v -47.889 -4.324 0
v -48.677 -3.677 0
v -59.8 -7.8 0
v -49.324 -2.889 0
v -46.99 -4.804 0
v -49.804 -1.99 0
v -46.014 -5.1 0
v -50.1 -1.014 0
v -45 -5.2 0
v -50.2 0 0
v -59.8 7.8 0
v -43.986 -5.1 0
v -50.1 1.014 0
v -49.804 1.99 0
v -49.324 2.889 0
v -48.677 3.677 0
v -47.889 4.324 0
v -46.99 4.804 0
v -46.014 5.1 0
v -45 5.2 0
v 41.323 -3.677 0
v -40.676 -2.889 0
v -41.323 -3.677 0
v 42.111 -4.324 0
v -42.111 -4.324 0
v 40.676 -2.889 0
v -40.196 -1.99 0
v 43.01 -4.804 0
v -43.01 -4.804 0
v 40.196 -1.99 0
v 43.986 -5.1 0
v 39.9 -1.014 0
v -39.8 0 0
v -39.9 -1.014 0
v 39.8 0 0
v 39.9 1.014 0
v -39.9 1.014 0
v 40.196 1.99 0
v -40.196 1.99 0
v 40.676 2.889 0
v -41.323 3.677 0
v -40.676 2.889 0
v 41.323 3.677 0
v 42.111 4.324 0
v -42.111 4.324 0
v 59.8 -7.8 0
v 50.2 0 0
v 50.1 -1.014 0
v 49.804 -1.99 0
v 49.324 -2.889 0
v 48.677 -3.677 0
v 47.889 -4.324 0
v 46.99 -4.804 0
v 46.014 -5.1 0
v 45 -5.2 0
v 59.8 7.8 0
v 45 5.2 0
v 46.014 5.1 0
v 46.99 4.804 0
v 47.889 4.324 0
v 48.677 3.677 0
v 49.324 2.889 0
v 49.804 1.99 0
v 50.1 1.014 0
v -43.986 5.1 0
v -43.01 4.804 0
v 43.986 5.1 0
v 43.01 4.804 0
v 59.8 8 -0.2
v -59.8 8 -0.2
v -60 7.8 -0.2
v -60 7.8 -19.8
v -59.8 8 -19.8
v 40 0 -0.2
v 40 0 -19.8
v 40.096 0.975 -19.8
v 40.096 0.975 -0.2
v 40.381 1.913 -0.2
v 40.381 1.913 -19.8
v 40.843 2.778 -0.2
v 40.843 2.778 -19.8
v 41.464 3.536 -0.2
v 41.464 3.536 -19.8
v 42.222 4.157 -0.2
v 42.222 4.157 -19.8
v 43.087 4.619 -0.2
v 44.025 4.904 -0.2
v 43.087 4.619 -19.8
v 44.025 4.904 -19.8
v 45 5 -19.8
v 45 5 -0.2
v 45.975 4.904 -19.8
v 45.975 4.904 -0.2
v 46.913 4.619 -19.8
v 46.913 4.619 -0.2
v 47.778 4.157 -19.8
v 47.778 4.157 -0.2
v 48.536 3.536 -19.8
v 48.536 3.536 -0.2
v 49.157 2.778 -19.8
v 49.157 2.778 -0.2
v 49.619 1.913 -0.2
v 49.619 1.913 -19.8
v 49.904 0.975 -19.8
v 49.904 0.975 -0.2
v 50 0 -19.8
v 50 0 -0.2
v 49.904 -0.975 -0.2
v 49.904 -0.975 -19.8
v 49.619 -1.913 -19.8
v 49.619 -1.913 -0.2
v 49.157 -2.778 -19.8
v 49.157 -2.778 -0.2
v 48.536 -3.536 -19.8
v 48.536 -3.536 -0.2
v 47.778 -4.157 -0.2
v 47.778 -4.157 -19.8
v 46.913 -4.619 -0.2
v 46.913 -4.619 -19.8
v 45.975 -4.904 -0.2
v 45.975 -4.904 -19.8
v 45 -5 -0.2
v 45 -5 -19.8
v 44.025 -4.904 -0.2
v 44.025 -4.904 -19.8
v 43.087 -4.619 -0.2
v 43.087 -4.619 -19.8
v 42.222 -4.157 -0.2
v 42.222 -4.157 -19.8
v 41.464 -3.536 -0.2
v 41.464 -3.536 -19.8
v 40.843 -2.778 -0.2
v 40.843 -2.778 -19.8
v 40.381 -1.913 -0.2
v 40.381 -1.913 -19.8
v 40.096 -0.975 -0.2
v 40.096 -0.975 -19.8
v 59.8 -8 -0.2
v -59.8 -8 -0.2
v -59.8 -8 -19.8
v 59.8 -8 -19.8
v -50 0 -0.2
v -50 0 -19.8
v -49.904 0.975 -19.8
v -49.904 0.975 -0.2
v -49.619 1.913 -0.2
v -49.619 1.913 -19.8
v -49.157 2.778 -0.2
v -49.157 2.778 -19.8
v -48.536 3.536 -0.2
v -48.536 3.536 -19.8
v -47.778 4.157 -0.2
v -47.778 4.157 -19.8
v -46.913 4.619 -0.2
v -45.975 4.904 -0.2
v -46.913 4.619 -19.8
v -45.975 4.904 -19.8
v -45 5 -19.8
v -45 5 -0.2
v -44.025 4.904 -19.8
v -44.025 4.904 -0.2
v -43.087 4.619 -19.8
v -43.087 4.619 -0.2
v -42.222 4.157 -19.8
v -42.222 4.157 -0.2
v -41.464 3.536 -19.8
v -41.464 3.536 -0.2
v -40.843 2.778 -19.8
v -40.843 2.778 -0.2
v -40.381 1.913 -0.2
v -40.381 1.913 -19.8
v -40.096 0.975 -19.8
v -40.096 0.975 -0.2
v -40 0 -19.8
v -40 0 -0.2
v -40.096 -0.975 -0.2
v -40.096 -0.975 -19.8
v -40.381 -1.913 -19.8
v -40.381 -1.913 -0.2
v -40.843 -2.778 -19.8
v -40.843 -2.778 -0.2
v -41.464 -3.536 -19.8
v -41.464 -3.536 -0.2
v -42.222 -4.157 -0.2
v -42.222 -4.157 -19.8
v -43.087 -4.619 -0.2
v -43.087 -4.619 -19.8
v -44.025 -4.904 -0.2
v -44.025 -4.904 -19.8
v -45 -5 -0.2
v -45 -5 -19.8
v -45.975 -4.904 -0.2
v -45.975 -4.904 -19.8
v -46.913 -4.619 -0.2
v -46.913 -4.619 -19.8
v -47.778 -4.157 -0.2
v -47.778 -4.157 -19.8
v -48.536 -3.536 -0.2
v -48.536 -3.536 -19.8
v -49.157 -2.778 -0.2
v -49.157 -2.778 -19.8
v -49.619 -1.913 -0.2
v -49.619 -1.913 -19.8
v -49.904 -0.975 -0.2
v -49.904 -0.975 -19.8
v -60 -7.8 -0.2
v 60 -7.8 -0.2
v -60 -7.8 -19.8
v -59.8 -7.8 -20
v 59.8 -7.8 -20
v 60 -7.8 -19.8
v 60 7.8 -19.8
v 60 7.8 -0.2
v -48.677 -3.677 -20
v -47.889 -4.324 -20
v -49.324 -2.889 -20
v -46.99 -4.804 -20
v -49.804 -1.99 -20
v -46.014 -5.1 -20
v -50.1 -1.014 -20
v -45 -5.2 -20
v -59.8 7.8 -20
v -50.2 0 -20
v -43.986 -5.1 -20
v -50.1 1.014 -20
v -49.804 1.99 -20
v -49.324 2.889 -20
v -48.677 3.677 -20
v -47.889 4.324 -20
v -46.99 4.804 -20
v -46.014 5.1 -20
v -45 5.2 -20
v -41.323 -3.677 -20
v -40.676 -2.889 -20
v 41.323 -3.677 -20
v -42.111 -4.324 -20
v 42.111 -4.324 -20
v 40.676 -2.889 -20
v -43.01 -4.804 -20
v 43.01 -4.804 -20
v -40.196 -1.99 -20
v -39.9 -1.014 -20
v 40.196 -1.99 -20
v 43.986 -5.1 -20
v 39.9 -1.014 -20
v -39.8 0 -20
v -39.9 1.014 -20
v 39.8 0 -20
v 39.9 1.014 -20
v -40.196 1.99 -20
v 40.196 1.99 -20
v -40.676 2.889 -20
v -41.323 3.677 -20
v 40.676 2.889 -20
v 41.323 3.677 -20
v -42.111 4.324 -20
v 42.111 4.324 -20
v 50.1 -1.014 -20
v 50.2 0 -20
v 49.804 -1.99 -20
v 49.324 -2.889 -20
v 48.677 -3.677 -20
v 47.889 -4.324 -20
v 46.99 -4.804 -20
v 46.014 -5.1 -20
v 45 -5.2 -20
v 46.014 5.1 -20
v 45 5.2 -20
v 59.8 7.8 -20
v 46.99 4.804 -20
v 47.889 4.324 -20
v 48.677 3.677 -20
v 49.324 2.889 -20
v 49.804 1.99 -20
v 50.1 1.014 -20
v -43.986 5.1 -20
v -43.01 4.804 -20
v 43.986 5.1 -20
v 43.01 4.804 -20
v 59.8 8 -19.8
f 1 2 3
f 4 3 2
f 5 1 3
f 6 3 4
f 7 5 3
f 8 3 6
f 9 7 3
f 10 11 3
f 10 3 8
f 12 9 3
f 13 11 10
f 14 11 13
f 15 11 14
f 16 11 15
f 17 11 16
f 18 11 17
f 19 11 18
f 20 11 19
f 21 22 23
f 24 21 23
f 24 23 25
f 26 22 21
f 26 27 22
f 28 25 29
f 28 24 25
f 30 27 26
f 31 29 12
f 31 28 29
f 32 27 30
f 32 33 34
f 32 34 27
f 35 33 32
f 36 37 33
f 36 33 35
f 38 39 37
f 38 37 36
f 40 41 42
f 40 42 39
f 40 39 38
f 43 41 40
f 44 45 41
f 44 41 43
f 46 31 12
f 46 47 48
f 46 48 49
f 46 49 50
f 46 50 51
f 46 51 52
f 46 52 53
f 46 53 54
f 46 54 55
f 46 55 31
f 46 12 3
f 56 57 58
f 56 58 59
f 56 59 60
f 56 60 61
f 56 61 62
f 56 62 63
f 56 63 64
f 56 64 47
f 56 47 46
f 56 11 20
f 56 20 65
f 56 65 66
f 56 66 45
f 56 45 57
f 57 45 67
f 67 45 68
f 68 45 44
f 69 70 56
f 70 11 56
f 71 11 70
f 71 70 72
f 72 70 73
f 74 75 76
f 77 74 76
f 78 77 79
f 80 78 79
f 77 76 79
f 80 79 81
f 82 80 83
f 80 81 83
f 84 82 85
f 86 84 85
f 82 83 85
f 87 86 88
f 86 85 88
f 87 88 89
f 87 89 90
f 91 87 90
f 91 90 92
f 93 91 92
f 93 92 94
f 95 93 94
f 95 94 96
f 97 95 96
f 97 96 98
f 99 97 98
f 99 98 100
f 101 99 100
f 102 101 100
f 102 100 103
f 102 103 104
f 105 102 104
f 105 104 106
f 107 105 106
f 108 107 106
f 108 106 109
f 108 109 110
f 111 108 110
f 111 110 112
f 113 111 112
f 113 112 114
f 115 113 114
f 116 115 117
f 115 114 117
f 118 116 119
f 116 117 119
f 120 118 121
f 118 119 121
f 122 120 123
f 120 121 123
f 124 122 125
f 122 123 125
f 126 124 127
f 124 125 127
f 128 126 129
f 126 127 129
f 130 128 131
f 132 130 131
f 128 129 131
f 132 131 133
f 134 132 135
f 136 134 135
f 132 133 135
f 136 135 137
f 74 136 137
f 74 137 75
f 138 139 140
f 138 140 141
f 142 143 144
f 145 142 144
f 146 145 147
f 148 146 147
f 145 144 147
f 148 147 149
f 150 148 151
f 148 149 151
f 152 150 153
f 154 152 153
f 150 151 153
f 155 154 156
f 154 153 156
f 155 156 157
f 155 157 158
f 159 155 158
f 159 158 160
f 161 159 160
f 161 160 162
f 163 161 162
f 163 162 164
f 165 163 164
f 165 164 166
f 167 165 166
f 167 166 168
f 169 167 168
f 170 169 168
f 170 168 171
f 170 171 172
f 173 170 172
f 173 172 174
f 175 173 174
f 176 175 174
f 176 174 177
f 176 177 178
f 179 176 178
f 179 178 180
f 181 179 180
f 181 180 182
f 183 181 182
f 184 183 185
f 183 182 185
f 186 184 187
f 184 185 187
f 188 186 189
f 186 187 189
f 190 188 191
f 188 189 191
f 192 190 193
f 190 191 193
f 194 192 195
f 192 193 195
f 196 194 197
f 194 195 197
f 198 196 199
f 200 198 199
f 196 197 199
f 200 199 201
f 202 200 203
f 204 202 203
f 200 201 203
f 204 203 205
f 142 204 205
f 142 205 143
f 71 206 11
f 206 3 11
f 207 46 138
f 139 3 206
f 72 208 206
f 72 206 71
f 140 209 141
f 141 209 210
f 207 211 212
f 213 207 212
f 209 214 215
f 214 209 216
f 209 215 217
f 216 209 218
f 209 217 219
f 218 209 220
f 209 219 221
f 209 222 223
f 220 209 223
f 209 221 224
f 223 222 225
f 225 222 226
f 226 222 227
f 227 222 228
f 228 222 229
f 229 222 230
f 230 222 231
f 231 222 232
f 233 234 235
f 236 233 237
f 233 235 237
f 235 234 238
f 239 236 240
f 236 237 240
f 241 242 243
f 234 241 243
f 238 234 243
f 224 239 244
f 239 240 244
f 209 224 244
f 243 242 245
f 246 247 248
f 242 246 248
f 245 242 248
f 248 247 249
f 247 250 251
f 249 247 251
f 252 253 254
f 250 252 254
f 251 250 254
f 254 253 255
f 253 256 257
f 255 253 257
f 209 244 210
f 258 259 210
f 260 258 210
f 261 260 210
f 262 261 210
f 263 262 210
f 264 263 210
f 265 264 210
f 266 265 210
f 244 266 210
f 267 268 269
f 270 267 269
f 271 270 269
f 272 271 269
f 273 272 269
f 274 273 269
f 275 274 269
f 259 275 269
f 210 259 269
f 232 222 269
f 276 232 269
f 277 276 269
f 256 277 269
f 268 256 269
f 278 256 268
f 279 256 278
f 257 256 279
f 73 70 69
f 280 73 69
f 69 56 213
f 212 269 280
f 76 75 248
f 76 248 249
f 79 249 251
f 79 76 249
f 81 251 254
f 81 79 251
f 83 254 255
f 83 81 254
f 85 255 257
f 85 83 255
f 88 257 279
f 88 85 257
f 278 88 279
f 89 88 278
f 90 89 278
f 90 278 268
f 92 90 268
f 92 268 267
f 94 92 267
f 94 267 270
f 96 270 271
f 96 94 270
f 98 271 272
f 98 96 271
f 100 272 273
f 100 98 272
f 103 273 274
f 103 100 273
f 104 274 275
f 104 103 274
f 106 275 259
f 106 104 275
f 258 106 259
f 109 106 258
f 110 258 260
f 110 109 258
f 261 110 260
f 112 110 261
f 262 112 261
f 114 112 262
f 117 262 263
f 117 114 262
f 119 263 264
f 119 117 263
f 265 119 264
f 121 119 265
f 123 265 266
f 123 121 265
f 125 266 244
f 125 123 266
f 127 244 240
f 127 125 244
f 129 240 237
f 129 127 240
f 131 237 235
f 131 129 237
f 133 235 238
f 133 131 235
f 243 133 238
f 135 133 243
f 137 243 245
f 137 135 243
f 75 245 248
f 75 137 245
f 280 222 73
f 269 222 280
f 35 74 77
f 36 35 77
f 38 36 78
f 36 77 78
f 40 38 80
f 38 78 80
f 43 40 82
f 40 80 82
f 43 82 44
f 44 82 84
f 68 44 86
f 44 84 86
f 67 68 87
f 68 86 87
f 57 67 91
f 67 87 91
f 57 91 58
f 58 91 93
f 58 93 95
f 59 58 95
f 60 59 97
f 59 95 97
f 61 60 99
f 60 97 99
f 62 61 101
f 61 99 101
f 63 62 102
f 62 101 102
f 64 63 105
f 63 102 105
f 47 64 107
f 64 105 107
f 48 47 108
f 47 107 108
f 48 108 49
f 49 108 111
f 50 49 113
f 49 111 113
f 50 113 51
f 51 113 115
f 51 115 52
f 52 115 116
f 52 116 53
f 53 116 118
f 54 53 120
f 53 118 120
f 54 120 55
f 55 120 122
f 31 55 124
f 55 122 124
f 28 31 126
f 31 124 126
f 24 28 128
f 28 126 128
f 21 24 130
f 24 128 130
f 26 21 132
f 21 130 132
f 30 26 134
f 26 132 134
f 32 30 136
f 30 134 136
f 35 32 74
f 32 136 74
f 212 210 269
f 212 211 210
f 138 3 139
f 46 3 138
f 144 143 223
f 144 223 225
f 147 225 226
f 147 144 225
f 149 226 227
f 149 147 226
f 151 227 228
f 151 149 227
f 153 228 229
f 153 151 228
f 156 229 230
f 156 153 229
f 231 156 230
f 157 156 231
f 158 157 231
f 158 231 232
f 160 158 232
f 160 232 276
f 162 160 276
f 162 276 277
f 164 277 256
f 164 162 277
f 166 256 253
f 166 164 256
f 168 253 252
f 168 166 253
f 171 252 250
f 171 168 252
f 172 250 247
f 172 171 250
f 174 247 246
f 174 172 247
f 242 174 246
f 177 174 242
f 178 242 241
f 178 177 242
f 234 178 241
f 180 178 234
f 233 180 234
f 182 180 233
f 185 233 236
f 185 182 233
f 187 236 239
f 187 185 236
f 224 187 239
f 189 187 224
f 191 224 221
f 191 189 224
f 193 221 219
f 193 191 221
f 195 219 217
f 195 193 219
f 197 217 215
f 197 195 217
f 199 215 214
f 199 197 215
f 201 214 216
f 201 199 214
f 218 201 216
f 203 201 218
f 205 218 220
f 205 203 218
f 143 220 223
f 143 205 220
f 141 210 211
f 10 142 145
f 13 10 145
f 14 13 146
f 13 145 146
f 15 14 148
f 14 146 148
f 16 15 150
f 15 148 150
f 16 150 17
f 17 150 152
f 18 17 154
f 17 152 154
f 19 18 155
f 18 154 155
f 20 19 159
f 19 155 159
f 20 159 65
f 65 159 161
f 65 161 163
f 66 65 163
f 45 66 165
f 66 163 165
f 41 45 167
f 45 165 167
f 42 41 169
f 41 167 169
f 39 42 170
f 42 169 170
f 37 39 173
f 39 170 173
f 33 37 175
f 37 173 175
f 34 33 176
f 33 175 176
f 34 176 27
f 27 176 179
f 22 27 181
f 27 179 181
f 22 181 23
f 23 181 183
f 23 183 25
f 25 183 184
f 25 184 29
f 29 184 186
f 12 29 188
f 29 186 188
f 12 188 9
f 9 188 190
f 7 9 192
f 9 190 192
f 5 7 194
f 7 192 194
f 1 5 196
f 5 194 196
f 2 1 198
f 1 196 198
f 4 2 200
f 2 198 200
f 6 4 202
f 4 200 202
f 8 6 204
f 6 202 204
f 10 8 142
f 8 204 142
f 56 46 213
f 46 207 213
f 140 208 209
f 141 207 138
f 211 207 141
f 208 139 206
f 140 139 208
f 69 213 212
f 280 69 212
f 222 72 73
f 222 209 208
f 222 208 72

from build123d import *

# Parameters (mm, degrees)
F0_W     = 120
F0_H     = 16
F1_DEPTH = 20
F3_D     = 10
F4_SIZE  = 0.2


with BuildPart() as f1:
    # F0 (on Top) → F1 (new body)
    with BuildSketch(Plane.XY):
        Rectangle(F0_W, F0_H)
    extrude(amount=-F1_DEPTH)

    # F3 (through all)
    with Locations(Plane.XY):
        with Locations((-45, 0), (45, 0)):
            Hole(F3_D / 2)

    # F4
    f4_edges = [f1.edges().sort_by_distance(p)[0] for p in [
        (0, 8, 0),
        (60, 0, 0),
        (-60, 0, 0),
        (0, -8, 0),
        (-50, 0, 0),
        (40, 0, 0),
        (-60, 8, -10),
        (-60, -8, -10),
        (-60, 0, -20),
        (0, 8, -20),
        (60, 0, -20),
        (0, -8, -20),
        (-50, 0, -20),
        (40, 0, -20),
        (60, 8, -10),
        (60, -8, -10),
    ]]
    chamfer(f4_edges, length=F4_SIZE)


solid = f1.part
